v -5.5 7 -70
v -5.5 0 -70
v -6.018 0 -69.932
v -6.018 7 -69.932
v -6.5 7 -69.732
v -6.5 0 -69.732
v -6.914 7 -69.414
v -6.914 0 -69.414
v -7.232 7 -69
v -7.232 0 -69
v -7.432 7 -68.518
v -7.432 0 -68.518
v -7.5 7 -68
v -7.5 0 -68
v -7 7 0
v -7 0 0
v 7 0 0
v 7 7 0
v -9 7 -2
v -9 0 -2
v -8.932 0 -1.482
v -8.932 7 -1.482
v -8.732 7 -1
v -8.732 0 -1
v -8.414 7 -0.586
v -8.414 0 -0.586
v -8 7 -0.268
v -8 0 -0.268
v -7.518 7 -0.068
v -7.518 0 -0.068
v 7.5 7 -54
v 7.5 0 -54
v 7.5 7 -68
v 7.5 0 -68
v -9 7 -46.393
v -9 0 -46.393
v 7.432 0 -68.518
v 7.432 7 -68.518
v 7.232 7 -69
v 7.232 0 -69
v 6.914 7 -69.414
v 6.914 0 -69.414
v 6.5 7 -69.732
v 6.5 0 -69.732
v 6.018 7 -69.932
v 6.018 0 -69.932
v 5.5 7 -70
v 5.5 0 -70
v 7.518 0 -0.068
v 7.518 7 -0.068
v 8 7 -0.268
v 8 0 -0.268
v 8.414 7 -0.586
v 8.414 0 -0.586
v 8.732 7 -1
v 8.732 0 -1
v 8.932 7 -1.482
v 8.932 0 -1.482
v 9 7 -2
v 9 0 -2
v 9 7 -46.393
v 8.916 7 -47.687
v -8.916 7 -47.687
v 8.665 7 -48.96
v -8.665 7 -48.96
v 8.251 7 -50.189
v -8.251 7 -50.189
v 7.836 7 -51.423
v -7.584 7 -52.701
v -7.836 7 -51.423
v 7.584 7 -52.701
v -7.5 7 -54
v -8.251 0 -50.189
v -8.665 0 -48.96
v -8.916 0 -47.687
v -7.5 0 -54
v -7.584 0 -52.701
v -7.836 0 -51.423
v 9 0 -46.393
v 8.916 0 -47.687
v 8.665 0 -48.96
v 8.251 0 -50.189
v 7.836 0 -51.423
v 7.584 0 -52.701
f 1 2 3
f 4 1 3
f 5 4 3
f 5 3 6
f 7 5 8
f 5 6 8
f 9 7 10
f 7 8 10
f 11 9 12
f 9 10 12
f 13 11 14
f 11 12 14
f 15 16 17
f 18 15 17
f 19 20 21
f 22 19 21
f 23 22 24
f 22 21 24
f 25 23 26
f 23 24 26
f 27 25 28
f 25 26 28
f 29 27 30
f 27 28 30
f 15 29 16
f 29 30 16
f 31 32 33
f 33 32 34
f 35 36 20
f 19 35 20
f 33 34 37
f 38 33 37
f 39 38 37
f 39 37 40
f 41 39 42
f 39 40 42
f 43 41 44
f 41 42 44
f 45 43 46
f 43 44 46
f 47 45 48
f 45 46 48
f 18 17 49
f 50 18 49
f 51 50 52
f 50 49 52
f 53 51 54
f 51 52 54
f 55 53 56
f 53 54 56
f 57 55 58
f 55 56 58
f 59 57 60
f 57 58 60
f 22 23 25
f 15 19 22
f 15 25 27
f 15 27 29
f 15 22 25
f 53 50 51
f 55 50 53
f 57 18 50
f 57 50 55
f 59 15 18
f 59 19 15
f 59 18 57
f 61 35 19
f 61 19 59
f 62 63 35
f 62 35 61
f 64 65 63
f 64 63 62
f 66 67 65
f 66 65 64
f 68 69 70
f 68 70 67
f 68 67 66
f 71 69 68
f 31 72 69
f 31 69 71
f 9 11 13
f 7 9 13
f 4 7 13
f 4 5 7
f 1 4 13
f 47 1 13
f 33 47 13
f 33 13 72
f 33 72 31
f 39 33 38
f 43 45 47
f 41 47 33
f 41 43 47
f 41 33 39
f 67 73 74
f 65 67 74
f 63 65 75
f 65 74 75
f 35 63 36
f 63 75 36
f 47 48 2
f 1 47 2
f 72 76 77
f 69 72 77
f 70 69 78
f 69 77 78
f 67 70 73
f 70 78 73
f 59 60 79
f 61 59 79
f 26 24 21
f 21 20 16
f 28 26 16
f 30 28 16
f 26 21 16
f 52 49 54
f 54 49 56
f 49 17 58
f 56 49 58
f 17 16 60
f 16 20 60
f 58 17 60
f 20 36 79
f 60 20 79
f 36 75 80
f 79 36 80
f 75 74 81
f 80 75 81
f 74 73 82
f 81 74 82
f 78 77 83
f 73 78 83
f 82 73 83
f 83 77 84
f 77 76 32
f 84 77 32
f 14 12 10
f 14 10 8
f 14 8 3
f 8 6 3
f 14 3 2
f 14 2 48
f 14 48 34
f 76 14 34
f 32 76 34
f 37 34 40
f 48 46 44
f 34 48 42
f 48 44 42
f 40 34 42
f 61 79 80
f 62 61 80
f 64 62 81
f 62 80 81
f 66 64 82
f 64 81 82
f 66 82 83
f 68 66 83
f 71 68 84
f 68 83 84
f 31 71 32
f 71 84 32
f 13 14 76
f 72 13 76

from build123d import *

# Parameters (mm, degrees)
EXTRUDE_1_DEPTH = 7


with BuildPart() as part:
    # 草图2 → 凸台-拉伸1 (new body)
    with BuildSketch(Plane(origin=(0, 0, 0), x_dir=(1, 0, 0), z_dir=(0, 1, 0))):
        with BuildLine():
            Line((0, 0), (7, 0))
            ThreePointArc((7, 0), (8.414213562, 0.585786438), (9, 2))
            Line((9, 2), (9, 46.39280404))
            ThreePointArc((9, 46.39280404), (8.811088093, 48.327371287), (8.251489914, 50.188845976))
            ThreePointArc((8.251489914, 50.188845976), (7.689663967, 52.057731217), (7.5, 53.999999998))
            Line((7.5, 53.999999998), (7.5, 67.999999998))
            ThreePointArc((7.5, 67.999999998), (6.914213562, 69.41421356), (5.5, 69.999999998))
            Line((5.5, 69.999999998), (0, 69.999999998))
            Line((0, 69.999999998), (-5.5, 69.999999998))
            ThreePointArc((-5.5, 69.999999998), (-6.914213562, 69.41421356), (-7.5, 67.999999998))
            Line((-7.5, 67.999999998), (-7.5, 53.999999998))
            ThreePointArc((-7.5, 53.999999998), (-7.689663967, 52.057731217), (-8.251489914, 50.188845976))
            ThreePointArc((-8.251489914, 50.188845976), (-8.811088093, 48.327371287), (-9, 46.39280404))
            Line((-9, 46.39280404), (-9, 2))
            ThreePointArc((-9, 2), (-8.414213562, 0.585786438), (-7, 0))
            Line((-7, 0), (0, 0))
        make_face()
    extrude(amount=EXTRUDE_1_DEPTH)


solid = part.part
